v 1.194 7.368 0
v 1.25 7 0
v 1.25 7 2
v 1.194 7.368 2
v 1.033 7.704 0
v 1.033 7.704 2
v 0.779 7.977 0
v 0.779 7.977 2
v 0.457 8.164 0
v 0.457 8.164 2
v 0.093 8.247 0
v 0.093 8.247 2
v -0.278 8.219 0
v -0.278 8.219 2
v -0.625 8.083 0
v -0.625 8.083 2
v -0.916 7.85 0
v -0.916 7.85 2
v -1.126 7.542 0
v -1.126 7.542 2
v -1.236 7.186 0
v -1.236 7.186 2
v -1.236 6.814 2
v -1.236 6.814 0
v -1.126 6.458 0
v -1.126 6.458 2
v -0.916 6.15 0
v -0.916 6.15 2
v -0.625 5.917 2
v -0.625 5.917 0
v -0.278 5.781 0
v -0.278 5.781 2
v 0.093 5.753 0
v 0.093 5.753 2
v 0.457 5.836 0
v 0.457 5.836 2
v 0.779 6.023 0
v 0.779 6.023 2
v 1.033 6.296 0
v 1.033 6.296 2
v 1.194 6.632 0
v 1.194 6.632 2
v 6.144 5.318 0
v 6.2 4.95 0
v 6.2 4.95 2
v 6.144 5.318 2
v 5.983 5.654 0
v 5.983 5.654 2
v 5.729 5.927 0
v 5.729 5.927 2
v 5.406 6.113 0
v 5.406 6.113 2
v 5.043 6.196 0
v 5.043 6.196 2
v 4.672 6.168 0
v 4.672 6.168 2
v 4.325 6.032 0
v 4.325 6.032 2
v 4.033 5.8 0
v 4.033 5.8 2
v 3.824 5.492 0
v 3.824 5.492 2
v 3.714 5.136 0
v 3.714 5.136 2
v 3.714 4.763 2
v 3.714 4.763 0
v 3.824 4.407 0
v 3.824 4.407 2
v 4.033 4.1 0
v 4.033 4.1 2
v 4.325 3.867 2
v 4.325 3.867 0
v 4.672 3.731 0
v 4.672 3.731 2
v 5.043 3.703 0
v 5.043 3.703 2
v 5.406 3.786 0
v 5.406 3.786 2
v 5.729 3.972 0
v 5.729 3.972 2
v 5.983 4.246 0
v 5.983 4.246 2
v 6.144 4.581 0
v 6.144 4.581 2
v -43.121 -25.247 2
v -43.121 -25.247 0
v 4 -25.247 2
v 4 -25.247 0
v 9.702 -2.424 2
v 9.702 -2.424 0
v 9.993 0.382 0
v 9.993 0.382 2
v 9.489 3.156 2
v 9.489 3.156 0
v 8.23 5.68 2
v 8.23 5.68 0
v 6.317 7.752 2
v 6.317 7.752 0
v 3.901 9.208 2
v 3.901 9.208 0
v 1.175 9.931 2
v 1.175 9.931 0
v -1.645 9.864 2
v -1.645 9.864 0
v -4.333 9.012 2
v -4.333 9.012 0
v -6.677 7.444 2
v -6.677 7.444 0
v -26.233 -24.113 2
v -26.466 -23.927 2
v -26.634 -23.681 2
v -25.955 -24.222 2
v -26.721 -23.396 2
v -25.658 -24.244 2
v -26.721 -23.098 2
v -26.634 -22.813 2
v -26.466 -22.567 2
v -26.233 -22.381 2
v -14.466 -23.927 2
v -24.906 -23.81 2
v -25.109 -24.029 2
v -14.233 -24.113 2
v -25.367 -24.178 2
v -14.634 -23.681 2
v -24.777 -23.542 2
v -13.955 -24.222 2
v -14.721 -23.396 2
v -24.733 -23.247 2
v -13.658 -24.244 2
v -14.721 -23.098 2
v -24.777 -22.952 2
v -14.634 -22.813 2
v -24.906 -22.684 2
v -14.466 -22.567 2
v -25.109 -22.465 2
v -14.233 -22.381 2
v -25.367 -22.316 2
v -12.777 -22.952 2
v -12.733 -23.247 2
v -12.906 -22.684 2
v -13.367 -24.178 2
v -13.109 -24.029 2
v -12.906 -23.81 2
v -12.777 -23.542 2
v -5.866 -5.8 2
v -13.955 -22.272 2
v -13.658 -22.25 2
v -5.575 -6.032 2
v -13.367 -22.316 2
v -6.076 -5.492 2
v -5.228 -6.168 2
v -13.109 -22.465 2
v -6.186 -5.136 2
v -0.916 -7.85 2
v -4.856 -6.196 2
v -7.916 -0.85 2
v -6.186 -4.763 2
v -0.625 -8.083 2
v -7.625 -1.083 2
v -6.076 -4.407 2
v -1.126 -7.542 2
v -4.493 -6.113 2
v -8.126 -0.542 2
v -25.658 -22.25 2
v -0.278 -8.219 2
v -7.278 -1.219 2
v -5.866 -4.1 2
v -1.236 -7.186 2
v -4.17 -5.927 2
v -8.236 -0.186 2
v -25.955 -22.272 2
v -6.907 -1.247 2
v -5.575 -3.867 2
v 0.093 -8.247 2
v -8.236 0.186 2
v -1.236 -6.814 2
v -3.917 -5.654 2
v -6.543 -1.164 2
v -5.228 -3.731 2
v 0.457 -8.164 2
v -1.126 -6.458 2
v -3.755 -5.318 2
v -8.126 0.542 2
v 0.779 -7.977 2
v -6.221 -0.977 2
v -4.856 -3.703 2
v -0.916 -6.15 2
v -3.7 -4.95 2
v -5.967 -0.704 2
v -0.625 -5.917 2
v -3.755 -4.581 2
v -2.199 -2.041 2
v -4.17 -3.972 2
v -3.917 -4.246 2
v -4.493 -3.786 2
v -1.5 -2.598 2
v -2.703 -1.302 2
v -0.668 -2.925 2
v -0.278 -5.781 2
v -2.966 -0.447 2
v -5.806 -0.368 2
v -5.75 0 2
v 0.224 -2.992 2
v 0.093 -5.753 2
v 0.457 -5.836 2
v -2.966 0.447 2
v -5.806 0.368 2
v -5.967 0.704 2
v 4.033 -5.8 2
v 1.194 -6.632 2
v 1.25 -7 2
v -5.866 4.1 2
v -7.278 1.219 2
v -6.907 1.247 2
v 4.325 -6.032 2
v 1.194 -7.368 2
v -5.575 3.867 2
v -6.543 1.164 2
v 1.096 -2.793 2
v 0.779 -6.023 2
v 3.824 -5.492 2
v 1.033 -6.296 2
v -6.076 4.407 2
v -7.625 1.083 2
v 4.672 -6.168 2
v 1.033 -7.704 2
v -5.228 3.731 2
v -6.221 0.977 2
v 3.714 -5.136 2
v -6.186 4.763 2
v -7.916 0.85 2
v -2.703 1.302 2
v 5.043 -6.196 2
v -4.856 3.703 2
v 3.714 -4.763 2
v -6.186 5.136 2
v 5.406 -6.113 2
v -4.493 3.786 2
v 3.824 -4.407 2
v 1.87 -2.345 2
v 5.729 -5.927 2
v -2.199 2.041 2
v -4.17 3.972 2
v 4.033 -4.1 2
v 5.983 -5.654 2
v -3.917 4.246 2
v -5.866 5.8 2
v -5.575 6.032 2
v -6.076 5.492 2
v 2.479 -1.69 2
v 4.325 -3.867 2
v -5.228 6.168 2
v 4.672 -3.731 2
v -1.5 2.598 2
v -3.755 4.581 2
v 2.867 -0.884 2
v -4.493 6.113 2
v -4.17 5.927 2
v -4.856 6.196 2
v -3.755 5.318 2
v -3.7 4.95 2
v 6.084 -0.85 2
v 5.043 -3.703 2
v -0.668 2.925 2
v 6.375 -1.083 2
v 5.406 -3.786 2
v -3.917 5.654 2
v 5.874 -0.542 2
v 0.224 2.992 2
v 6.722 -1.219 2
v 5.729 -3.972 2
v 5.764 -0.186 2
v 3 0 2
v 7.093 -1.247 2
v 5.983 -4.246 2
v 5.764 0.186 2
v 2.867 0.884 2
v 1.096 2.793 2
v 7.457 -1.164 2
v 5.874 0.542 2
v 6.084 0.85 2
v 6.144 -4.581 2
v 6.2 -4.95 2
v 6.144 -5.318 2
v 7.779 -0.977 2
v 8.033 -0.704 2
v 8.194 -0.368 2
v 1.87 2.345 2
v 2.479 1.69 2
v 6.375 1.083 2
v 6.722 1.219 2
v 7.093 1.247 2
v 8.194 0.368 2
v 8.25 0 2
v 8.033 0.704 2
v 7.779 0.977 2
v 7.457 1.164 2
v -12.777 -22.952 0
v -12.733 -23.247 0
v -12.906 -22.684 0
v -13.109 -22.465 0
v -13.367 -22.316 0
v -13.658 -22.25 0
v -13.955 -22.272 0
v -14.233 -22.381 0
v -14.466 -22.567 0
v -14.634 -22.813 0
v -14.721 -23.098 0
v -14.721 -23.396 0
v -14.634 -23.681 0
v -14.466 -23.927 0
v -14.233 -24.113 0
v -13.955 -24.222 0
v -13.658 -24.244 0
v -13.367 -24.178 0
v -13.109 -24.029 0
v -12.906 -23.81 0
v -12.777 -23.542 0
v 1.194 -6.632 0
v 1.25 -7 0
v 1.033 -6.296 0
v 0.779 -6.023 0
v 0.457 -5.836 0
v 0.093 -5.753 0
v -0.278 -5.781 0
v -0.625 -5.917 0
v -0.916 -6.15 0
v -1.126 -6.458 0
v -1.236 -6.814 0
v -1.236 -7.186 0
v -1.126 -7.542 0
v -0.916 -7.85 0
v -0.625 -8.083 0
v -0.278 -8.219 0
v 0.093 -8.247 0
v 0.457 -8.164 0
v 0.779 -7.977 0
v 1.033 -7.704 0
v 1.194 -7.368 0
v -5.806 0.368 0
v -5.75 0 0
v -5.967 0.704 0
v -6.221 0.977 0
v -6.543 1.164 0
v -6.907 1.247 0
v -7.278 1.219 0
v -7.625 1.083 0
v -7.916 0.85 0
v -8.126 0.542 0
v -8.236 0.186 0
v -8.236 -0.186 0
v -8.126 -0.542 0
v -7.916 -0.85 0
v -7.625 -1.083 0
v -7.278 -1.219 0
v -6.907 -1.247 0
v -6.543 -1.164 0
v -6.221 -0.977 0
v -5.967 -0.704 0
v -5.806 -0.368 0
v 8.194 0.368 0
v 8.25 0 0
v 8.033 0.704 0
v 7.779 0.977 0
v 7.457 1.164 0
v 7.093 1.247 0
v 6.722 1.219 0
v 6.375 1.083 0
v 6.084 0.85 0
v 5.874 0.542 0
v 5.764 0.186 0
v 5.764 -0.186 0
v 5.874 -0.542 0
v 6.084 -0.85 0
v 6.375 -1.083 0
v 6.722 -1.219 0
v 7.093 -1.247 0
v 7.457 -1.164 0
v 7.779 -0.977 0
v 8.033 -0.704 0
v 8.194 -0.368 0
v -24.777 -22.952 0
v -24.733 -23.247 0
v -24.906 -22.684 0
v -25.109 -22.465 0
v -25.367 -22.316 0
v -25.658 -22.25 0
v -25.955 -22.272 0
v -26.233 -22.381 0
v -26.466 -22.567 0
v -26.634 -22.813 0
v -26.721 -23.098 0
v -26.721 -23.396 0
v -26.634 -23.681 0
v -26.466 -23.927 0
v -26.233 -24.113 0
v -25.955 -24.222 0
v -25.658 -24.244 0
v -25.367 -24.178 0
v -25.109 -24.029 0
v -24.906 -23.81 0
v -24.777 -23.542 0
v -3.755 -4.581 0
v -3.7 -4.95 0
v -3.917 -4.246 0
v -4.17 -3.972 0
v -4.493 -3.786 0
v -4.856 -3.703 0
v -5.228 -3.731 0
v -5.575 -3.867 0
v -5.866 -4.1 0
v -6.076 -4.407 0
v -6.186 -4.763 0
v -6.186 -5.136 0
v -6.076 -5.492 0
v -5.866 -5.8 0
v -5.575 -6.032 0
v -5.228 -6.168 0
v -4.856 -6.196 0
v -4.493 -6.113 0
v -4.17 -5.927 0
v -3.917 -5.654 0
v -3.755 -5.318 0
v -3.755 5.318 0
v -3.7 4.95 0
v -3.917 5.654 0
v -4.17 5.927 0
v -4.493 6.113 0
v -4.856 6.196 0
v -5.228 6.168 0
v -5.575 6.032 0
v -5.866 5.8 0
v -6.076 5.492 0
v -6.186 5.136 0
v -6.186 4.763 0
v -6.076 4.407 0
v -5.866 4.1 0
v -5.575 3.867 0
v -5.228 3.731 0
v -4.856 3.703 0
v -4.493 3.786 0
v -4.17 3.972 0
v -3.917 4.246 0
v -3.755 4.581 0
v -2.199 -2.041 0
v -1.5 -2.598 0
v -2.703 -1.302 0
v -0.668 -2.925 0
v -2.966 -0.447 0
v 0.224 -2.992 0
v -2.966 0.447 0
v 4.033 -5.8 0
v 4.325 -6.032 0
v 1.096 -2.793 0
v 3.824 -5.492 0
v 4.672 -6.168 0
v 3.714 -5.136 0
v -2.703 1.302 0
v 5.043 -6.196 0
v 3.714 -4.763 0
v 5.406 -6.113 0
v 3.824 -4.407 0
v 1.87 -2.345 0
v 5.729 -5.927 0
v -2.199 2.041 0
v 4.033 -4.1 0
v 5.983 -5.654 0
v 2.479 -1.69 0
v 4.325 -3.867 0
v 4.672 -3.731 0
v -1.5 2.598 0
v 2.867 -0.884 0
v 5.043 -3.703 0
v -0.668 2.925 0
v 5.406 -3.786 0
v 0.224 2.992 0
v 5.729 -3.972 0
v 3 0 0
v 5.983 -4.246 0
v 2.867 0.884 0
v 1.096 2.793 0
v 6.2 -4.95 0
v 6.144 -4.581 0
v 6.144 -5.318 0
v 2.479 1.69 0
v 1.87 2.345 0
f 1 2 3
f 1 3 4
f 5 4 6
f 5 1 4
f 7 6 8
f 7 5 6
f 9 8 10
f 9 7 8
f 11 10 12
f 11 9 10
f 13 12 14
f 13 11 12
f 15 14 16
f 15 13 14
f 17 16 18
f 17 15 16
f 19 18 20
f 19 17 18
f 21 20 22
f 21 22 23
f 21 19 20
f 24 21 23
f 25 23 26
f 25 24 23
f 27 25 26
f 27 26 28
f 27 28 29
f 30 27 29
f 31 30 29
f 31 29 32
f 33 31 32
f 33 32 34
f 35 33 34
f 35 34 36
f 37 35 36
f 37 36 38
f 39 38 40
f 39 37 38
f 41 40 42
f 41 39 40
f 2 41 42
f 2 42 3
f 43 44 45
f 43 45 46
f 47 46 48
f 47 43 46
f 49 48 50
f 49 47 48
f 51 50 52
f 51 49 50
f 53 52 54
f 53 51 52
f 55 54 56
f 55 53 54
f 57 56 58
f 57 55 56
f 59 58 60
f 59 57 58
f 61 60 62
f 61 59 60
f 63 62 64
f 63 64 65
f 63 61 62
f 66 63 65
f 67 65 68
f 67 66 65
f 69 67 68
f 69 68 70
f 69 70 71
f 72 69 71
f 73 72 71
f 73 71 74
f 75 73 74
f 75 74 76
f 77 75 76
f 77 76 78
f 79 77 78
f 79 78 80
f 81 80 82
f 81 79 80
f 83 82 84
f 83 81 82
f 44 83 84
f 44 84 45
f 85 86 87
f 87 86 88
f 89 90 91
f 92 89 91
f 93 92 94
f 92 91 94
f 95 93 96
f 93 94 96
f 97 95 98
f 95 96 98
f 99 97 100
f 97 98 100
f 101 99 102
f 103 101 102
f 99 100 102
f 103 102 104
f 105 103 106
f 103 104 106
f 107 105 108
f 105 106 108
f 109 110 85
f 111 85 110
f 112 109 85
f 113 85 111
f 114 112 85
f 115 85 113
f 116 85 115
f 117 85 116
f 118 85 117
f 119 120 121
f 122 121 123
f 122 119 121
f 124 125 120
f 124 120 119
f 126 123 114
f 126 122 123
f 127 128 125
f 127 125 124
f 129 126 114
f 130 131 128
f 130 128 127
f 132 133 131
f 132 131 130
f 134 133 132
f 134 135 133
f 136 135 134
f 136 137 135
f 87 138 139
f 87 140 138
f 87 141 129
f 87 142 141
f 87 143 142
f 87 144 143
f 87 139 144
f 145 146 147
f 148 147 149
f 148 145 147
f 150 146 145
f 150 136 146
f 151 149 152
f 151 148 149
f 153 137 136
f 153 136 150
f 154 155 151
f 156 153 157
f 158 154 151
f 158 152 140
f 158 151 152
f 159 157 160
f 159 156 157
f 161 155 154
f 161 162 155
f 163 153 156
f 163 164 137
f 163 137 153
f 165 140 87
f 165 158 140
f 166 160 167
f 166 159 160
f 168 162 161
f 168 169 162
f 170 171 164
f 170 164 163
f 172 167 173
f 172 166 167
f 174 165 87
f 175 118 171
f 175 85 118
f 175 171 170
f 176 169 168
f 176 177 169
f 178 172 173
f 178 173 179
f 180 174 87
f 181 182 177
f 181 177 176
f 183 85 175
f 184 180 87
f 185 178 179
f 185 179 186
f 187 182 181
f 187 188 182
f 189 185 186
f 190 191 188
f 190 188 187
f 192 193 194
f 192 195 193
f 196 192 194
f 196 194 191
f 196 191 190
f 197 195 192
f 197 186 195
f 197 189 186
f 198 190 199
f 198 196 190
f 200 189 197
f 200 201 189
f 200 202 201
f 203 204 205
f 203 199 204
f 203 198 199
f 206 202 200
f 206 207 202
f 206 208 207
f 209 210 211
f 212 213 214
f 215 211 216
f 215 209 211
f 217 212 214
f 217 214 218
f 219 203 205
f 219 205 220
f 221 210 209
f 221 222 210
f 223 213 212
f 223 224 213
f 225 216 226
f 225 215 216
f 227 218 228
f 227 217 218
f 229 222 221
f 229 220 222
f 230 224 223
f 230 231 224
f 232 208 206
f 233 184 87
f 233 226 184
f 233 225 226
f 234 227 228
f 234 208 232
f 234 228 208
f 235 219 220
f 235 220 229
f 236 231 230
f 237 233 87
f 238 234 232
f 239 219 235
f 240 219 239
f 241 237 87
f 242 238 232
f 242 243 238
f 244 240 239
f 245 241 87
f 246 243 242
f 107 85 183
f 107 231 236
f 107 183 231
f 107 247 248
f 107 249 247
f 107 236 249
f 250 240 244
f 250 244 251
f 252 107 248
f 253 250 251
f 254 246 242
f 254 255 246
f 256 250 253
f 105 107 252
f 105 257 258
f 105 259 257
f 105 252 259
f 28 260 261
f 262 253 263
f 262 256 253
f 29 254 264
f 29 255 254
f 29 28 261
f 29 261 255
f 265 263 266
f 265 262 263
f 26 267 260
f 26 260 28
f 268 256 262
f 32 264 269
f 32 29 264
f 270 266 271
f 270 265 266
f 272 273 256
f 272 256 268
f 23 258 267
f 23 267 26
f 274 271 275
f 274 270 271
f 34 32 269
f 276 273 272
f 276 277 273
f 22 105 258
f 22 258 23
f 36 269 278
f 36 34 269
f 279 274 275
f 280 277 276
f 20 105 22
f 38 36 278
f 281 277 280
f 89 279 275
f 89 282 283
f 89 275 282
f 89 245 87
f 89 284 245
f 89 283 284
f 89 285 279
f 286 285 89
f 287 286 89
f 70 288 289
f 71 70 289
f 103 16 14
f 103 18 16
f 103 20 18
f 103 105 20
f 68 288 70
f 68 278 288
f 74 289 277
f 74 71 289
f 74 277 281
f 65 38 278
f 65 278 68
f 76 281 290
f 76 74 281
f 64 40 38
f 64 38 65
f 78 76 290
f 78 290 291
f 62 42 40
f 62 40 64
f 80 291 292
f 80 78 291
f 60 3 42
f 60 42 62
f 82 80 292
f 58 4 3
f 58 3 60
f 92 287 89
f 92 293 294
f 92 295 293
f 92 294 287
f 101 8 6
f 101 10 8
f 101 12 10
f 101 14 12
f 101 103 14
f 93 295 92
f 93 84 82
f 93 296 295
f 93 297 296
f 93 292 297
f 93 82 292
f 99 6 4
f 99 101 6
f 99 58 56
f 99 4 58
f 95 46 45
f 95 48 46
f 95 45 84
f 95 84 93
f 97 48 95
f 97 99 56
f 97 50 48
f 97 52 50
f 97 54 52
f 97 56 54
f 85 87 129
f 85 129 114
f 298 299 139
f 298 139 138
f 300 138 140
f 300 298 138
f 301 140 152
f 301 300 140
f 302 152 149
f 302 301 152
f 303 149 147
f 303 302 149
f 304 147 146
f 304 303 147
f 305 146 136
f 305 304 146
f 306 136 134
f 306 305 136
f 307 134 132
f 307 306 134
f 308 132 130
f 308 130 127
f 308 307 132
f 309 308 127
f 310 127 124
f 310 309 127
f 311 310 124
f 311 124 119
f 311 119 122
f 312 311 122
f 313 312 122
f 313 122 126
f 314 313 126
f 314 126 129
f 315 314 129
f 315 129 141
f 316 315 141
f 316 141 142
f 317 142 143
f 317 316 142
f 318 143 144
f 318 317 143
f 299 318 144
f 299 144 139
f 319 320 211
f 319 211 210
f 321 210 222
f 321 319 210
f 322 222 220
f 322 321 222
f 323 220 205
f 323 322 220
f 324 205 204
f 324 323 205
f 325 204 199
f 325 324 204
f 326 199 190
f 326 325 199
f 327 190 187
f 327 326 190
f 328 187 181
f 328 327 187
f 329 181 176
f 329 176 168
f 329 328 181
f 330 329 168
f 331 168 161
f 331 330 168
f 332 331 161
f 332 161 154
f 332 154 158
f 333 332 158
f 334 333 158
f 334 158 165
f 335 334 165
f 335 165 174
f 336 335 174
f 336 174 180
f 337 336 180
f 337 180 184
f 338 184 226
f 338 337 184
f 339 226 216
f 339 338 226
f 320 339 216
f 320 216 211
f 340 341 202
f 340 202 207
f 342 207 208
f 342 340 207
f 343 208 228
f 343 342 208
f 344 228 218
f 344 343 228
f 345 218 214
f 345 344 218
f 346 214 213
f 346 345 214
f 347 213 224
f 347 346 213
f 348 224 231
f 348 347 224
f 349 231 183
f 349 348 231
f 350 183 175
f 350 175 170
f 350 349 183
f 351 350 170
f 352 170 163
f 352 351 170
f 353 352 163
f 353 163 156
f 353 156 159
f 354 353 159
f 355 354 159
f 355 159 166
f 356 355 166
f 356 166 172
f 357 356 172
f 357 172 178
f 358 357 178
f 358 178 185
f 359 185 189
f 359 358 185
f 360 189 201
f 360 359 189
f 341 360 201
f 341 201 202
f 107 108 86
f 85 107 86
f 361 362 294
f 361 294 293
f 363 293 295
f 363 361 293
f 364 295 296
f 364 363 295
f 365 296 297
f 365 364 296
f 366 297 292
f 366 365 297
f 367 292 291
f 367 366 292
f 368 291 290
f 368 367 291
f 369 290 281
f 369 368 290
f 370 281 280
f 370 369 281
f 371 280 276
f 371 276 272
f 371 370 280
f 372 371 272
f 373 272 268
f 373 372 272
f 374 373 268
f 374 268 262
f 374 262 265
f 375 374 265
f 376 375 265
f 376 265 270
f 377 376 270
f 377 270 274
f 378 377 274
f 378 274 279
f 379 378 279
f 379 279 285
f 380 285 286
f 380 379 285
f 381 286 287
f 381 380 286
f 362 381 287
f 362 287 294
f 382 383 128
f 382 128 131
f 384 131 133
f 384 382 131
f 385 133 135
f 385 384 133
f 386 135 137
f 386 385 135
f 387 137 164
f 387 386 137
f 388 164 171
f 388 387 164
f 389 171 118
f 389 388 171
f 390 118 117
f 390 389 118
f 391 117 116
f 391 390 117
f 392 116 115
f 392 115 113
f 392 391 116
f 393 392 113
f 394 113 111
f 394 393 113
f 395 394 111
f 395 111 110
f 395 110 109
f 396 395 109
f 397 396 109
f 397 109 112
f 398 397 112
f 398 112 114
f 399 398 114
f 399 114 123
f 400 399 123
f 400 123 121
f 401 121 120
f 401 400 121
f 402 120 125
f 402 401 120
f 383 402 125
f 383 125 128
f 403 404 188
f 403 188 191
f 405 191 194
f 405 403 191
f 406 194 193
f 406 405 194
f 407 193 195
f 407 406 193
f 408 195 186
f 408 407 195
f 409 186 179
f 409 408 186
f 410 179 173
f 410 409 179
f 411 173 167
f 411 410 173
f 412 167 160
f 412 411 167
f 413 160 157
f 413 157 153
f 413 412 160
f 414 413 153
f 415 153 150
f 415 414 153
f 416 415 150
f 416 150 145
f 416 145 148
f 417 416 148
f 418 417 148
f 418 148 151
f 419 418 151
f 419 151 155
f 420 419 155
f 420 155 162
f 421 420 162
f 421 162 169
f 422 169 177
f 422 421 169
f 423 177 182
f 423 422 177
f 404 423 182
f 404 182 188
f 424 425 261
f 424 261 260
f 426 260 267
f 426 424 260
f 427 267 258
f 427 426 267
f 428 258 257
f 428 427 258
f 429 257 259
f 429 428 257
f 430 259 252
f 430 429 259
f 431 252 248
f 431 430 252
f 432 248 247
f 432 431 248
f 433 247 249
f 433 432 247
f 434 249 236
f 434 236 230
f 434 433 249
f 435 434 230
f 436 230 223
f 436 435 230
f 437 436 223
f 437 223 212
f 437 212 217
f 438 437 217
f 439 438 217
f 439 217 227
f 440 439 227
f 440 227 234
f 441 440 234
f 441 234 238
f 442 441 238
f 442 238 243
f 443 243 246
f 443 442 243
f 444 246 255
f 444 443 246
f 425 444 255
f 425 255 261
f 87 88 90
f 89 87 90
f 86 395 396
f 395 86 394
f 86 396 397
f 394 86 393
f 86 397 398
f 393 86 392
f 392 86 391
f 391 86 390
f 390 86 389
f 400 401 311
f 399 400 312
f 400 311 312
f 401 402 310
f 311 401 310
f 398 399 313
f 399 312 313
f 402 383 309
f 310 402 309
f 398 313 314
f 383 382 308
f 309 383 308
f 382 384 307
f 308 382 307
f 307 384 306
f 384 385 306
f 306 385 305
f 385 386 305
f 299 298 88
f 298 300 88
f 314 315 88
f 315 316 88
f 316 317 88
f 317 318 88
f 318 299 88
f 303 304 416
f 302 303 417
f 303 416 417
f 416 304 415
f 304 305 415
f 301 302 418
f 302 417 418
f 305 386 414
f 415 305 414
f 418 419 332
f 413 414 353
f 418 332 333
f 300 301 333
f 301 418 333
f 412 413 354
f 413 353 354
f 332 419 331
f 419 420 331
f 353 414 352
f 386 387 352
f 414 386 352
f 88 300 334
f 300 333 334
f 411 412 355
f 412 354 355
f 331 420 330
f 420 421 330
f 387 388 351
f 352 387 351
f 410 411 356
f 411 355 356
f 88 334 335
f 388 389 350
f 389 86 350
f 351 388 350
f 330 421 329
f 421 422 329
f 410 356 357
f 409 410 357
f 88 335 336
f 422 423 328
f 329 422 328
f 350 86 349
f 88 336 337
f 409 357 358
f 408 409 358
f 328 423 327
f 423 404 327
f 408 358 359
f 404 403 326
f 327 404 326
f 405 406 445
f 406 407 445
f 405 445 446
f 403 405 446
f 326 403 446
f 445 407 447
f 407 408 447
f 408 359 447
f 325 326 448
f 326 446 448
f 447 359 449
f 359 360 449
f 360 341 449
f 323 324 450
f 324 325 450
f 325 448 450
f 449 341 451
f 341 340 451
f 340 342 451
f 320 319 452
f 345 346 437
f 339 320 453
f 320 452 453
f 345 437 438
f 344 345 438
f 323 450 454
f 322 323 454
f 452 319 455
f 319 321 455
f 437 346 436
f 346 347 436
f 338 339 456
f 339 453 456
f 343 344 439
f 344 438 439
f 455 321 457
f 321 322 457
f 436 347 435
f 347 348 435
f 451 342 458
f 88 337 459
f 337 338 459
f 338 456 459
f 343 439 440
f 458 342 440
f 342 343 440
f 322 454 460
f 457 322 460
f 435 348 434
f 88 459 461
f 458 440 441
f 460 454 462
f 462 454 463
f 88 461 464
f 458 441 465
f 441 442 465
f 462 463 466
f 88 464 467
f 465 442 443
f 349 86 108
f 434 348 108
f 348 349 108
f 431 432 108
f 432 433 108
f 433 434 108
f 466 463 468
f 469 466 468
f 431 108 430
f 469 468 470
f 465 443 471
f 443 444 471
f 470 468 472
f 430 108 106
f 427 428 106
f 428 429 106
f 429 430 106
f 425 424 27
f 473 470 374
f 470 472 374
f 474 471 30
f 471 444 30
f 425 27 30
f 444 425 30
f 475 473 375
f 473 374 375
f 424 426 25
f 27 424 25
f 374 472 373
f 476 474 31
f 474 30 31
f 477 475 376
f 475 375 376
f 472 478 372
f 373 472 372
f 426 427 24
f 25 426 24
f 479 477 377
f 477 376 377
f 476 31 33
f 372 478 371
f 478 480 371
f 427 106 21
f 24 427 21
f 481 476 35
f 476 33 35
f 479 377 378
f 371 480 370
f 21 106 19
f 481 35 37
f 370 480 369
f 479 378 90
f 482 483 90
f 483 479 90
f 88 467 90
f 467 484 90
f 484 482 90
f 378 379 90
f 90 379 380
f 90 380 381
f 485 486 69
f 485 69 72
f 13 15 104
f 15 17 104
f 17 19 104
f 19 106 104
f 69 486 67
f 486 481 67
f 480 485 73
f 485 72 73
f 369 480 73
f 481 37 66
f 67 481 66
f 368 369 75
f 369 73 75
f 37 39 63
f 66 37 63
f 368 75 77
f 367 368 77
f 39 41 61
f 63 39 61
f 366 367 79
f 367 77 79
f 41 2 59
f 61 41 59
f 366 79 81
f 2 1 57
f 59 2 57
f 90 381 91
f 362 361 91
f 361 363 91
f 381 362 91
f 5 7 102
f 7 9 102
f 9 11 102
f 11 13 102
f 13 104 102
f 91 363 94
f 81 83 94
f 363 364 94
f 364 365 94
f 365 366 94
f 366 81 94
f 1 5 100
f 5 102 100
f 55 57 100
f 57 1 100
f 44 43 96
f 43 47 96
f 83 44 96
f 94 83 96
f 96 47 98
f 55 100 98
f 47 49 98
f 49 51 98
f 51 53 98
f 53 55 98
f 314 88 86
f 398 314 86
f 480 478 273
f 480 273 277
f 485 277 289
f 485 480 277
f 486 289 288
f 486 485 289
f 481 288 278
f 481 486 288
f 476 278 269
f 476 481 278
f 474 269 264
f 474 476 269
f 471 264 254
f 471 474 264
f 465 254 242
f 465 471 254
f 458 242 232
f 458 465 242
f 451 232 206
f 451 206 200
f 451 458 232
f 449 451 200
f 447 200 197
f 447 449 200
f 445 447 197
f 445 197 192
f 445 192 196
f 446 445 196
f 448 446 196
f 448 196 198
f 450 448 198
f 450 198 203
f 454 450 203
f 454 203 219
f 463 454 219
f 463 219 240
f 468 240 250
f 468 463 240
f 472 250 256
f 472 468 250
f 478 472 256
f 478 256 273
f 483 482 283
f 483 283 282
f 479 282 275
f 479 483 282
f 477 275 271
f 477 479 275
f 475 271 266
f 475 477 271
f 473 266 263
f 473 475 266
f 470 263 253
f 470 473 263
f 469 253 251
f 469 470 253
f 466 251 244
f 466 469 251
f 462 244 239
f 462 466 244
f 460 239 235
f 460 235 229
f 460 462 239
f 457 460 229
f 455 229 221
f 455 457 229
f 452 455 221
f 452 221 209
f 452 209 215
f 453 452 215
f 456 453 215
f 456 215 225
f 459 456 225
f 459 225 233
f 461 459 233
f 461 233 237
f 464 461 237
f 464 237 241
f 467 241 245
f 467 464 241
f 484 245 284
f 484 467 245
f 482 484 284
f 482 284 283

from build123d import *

# Parameters (mm, degrees)
SKETCH_1_R      = 3
SKETCH_1_R_2    = 1.25
SKETCH_1_R_3    = 1
EXTRUDE_1_DEPTH = 2


with BuildPart() as part:
    # 草圖1 → 填料-伸長1 (new body)
    with BuildSketch(Plane.XY):
        with BuildLine():
            Line((-41.078680873, -25.246867961), (3.125001345, -25.246867961))
            Line((3.125001345, -25.246867961), (4.000056753, -25.246867961))
            Line((4.000056753, -25.246867961), (9.701825934, -2.423751958))
            ThreePointArc((9.701825934, -2.423751958), (5.1603748, 8.56566004), (-6.677431122, 7.443917894))
            Line((-6.677431122, 7.443917894), (-43.120716176, -25.246867961))
            Line((-43.120716176, -25.246867961), (-41.078680873, -25.246867961))
        make_face()
        Circle(SKETCH_1_R, mode=Mode.SUBTRACT)
        with Locations((0, 7)):
            Circle(SKETCH_1_R_2, mode=Mode.SUBTRACT)
        with Locations((4.949747468, 4.949747468)):
            Circle(SKETCH_1_R_2, mode=Mode.SUBTRACT)
        with Locations((7, 0)):
            Circle(SKETCH_1_R_2, mode=Mode.SUBTRACT)
        with Locations((4.949747468, -4.949747468)):
            Circle(SKETCH_1_R_2, mode=Mode.SUBTRACT)
        with Locations((0, -7)):
            Circle(SKETCH_1_R_2, mode=Mode.SUBTRACT)
        with Locations((-4.949747468, -4.949747468)):
            Circle(SKETCH_1_R_2, mode=Mode.SUBTRACT)
        with Locations((-7, 0)):
            Circle(SKETCH_1_R_2, mode=Mode.SUBTRACT)
        with Locations((-4.949747468, 4.949747468)):
            Circle(SKETCH_1_R_2, mode=Mode.SUBTRACT)
        with Locations((-13.732609449, -23.246867961)):
            Circle(SKETCH_1_R_3, mode=Mode.SUBTRACT)
        with Locations((-25.732609449, -23.246867961)):
            Circle(SKETCH_1_R_3, mode=Mode.SUBTRACT)
    extrude(amount=EXTRUDE_1_DEPTH)


solid = part.part
